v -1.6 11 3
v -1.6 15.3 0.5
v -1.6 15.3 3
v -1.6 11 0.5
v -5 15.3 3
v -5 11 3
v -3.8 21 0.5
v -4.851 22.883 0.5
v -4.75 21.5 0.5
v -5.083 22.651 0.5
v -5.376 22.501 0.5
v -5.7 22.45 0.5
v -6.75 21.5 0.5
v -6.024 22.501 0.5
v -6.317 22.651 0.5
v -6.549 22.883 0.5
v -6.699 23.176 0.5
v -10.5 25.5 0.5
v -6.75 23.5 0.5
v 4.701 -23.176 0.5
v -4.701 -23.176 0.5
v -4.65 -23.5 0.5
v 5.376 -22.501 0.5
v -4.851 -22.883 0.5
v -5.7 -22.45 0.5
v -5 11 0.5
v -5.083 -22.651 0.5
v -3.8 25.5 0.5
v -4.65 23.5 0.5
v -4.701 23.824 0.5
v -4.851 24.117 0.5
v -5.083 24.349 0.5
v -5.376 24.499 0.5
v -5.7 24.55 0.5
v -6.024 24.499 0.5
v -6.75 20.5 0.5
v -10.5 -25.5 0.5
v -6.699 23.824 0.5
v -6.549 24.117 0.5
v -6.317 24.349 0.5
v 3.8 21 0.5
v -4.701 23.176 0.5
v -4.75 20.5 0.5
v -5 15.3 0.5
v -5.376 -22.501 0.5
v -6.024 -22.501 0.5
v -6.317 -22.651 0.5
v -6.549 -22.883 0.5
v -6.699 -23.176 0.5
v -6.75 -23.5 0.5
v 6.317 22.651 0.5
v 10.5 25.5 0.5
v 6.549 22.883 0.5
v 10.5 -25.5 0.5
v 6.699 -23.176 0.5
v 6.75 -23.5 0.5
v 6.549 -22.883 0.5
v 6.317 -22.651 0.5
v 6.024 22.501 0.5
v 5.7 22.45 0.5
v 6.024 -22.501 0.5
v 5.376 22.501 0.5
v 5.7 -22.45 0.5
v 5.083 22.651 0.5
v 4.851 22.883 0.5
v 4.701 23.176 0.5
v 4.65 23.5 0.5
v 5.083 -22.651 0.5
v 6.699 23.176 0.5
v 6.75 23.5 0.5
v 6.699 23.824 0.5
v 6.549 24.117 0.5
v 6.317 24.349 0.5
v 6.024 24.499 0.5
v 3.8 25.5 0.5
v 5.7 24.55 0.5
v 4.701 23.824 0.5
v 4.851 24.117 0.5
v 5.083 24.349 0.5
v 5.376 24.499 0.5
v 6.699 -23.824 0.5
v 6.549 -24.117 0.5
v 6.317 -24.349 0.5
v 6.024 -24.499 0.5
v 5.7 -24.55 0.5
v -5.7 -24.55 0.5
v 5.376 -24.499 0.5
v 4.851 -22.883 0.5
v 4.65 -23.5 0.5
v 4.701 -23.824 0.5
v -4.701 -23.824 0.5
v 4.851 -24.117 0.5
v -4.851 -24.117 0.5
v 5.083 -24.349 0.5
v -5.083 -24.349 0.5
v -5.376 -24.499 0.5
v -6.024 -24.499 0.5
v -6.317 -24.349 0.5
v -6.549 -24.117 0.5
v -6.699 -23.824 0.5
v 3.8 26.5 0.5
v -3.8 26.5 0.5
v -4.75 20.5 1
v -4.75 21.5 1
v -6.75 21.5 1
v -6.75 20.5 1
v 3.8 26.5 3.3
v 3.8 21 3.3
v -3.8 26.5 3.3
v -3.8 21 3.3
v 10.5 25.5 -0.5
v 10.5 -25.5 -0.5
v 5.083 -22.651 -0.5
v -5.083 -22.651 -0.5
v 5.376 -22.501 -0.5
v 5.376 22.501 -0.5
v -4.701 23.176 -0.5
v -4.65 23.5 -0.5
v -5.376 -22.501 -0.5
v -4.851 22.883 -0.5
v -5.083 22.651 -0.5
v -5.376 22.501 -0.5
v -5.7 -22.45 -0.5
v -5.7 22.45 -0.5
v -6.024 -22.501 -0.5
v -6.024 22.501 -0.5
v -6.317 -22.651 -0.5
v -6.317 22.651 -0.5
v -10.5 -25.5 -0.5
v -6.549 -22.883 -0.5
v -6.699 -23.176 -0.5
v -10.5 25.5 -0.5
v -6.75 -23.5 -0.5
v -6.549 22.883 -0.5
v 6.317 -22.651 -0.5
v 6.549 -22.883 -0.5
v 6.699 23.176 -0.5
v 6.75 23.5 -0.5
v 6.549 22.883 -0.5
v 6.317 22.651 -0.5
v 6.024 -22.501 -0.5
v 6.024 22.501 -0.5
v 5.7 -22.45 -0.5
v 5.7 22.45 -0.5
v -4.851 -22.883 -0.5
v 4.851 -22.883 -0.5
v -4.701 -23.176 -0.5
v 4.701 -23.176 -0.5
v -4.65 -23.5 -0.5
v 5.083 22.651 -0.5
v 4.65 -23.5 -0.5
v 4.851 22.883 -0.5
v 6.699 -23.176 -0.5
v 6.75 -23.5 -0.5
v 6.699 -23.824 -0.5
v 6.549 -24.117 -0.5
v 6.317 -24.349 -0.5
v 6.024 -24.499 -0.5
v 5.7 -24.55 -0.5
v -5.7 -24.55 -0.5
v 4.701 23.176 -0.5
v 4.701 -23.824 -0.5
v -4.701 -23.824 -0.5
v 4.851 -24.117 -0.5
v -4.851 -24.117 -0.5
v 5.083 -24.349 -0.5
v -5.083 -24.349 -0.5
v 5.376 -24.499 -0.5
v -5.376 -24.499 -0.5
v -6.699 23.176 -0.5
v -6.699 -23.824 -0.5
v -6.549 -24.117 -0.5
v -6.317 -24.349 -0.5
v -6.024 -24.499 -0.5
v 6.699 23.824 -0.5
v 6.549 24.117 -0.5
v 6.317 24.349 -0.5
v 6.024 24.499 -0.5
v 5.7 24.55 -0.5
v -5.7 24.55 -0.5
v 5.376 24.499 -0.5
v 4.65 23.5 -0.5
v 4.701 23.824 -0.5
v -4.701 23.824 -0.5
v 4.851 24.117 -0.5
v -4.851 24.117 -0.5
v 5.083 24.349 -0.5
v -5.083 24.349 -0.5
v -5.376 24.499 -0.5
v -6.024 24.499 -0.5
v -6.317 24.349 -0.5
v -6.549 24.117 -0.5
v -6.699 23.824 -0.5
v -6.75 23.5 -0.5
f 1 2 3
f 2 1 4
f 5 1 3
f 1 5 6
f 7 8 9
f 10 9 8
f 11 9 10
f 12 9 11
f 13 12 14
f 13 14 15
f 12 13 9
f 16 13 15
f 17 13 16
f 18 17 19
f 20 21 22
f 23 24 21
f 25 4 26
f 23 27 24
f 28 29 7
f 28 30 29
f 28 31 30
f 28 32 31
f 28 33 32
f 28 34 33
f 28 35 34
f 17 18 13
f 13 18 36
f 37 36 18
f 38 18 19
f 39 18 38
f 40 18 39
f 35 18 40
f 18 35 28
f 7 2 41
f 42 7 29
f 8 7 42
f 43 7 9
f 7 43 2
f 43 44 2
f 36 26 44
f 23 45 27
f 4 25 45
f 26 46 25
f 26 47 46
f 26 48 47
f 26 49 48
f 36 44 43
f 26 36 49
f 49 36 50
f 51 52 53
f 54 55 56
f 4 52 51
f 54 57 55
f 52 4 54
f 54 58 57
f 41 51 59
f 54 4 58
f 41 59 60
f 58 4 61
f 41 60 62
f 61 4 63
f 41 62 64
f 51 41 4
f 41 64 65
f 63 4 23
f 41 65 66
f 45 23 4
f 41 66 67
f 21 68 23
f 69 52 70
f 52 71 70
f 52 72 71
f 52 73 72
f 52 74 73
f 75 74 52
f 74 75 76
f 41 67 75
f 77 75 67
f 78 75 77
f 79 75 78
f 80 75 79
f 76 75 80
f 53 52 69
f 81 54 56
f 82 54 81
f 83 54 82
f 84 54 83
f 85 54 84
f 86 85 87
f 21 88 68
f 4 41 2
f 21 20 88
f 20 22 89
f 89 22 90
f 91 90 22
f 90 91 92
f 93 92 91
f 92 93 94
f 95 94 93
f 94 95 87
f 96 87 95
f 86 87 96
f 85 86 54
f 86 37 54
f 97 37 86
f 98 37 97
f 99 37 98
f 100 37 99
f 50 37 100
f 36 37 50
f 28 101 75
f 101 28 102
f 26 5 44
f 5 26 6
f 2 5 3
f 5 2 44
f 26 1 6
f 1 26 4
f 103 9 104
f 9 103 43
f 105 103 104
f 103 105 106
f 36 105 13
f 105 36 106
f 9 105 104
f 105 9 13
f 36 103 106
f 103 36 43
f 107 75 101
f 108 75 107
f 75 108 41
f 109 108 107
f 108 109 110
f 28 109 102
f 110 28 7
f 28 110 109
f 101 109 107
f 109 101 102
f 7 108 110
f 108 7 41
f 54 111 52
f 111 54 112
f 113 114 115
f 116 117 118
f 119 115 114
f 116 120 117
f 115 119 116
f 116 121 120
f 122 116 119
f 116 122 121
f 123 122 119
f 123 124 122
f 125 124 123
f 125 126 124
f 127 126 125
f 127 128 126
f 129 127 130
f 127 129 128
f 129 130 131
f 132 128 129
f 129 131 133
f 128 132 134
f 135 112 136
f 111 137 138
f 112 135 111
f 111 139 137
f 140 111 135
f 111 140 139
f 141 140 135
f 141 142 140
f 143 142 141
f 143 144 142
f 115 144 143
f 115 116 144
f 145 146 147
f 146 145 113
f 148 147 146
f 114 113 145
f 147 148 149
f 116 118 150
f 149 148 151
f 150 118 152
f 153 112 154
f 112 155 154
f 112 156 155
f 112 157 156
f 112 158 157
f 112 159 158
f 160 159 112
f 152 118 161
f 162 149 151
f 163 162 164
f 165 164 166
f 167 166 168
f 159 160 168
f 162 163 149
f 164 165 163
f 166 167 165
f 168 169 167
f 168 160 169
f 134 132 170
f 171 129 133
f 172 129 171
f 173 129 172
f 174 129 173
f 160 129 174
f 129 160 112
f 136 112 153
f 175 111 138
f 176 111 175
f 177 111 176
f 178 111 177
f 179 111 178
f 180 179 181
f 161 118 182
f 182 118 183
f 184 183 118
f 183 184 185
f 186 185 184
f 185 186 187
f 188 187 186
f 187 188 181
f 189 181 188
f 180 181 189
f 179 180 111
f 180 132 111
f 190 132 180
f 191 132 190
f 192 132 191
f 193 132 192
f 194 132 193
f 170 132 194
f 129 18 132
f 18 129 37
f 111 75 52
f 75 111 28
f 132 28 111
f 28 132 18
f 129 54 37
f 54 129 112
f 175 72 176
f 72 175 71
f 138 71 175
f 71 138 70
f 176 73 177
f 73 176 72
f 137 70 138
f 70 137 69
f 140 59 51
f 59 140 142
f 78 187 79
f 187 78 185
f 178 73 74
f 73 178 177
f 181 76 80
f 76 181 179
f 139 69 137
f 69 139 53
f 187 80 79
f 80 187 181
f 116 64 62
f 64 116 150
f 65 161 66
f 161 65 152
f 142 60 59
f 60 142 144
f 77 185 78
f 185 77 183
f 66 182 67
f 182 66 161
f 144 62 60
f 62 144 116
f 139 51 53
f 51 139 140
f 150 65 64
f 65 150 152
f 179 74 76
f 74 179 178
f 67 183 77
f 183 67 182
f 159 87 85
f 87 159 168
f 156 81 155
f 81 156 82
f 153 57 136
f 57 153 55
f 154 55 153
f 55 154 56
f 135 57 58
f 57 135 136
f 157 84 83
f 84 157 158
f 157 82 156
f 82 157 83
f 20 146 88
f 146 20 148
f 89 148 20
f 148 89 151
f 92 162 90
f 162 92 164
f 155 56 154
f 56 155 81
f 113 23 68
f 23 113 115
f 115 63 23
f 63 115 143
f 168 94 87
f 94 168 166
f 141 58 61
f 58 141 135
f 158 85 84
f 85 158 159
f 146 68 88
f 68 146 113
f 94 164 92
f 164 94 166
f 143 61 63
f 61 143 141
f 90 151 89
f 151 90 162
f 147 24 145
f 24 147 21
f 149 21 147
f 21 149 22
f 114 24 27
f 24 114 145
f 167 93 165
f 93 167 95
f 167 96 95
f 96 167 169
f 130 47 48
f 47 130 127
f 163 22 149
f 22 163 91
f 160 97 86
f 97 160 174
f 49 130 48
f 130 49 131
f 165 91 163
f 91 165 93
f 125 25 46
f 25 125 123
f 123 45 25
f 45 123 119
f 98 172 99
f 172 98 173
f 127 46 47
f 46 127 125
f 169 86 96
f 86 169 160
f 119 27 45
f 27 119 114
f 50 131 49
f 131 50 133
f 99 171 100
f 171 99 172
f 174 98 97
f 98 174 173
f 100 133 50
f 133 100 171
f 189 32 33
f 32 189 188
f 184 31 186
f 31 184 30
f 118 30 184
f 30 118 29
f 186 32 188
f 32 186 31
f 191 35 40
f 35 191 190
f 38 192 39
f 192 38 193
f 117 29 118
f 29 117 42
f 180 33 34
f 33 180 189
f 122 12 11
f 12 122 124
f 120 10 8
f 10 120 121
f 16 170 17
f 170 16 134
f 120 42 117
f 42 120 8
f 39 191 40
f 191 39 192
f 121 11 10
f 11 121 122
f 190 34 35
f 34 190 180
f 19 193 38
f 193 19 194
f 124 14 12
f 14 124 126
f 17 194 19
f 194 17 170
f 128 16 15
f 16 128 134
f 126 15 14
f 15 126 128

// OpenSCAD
// from https://github.com/alanpreed/Picoprobe-enclosure

pico_x = 21;
pico_y = 51;
pico_z = 1;
pico_hole_d = 2.1;
pico_hole_x_pos = 11.4 / 2;
pico_hole_y_pos = (pico_y / 2) - 2;

button_x = 3.4;
button_y = 4.3;
button_z = 2.5;
button_x_pos = -((pico_x / 2) - 5.5);
button_y_pos = ((pico_y / 2) - 14.5);

led_x = 2;
led_y = 1;
led_z = 0.5;
led_x_pos = -(pico_x / 2 - 3.75);
led_y_pos = pico_y / 2 - 5;

usb_x = 7.6;
usb_y = 5.5;
usb_z = 2.8;
usb_x_pos = 0;
usb_y_pos = pico_y/2 - 4.5;
usb_z_pos = 0;



module pico_holes(){
    for (i = [[pico_hole_x_pos, pico_hole_y_pos, 0], 
           [pico_hole_x_pos, -pico_hole_y_pos, 0], 
           [-pico_hole_x_pos, -pico_hole_y_pos, 0], 
           [-pico_hole_x_pos, pico_hole_y_pos, 0]]){
        translate(i){
            children();
        }
    }
}

module pico_button(){
    translate([button_x_pos + button_x/2, button_y_pos + button_y/2, 0]){
        children();
    }
}

module pico_led(){
    translate([led_x_pos + led_x/2, led_y_pos + led_y / 2, 0]){
        children();
    }
}

module pico_usb(){
    translate([usb_x_pos, usb_y_pos + usb_y/2, usb_z_pos]){
        children();
    }
}

module pico(){
    difference(){
        union(){
            cube([pico_x, pico_y, pico_z], center=true);
            translate([0, 0, pico_z/2]){
                pico_button(){
                    translate([0, 0, button_z/2]){
                        cube([button_x, button_y, button_z], center=true);
                    }
                }
                pico_led(){
                    translate([0, 0, led_z/2]){
                        cube([led_x, led_y, led_z], center=true);
                    }
                }
                pico_usb(){
                    translate([0, 0, usb_z/2]){
                        cube([usb_x, usb_y, usb_z], center=true);
                    }
                }                
            }
        }
        
        pico_holes(){
            cylinder(h = 2* pico_z, d = pico_hole_d, center=true, $fn=20);
        }
    }
}

pico();
